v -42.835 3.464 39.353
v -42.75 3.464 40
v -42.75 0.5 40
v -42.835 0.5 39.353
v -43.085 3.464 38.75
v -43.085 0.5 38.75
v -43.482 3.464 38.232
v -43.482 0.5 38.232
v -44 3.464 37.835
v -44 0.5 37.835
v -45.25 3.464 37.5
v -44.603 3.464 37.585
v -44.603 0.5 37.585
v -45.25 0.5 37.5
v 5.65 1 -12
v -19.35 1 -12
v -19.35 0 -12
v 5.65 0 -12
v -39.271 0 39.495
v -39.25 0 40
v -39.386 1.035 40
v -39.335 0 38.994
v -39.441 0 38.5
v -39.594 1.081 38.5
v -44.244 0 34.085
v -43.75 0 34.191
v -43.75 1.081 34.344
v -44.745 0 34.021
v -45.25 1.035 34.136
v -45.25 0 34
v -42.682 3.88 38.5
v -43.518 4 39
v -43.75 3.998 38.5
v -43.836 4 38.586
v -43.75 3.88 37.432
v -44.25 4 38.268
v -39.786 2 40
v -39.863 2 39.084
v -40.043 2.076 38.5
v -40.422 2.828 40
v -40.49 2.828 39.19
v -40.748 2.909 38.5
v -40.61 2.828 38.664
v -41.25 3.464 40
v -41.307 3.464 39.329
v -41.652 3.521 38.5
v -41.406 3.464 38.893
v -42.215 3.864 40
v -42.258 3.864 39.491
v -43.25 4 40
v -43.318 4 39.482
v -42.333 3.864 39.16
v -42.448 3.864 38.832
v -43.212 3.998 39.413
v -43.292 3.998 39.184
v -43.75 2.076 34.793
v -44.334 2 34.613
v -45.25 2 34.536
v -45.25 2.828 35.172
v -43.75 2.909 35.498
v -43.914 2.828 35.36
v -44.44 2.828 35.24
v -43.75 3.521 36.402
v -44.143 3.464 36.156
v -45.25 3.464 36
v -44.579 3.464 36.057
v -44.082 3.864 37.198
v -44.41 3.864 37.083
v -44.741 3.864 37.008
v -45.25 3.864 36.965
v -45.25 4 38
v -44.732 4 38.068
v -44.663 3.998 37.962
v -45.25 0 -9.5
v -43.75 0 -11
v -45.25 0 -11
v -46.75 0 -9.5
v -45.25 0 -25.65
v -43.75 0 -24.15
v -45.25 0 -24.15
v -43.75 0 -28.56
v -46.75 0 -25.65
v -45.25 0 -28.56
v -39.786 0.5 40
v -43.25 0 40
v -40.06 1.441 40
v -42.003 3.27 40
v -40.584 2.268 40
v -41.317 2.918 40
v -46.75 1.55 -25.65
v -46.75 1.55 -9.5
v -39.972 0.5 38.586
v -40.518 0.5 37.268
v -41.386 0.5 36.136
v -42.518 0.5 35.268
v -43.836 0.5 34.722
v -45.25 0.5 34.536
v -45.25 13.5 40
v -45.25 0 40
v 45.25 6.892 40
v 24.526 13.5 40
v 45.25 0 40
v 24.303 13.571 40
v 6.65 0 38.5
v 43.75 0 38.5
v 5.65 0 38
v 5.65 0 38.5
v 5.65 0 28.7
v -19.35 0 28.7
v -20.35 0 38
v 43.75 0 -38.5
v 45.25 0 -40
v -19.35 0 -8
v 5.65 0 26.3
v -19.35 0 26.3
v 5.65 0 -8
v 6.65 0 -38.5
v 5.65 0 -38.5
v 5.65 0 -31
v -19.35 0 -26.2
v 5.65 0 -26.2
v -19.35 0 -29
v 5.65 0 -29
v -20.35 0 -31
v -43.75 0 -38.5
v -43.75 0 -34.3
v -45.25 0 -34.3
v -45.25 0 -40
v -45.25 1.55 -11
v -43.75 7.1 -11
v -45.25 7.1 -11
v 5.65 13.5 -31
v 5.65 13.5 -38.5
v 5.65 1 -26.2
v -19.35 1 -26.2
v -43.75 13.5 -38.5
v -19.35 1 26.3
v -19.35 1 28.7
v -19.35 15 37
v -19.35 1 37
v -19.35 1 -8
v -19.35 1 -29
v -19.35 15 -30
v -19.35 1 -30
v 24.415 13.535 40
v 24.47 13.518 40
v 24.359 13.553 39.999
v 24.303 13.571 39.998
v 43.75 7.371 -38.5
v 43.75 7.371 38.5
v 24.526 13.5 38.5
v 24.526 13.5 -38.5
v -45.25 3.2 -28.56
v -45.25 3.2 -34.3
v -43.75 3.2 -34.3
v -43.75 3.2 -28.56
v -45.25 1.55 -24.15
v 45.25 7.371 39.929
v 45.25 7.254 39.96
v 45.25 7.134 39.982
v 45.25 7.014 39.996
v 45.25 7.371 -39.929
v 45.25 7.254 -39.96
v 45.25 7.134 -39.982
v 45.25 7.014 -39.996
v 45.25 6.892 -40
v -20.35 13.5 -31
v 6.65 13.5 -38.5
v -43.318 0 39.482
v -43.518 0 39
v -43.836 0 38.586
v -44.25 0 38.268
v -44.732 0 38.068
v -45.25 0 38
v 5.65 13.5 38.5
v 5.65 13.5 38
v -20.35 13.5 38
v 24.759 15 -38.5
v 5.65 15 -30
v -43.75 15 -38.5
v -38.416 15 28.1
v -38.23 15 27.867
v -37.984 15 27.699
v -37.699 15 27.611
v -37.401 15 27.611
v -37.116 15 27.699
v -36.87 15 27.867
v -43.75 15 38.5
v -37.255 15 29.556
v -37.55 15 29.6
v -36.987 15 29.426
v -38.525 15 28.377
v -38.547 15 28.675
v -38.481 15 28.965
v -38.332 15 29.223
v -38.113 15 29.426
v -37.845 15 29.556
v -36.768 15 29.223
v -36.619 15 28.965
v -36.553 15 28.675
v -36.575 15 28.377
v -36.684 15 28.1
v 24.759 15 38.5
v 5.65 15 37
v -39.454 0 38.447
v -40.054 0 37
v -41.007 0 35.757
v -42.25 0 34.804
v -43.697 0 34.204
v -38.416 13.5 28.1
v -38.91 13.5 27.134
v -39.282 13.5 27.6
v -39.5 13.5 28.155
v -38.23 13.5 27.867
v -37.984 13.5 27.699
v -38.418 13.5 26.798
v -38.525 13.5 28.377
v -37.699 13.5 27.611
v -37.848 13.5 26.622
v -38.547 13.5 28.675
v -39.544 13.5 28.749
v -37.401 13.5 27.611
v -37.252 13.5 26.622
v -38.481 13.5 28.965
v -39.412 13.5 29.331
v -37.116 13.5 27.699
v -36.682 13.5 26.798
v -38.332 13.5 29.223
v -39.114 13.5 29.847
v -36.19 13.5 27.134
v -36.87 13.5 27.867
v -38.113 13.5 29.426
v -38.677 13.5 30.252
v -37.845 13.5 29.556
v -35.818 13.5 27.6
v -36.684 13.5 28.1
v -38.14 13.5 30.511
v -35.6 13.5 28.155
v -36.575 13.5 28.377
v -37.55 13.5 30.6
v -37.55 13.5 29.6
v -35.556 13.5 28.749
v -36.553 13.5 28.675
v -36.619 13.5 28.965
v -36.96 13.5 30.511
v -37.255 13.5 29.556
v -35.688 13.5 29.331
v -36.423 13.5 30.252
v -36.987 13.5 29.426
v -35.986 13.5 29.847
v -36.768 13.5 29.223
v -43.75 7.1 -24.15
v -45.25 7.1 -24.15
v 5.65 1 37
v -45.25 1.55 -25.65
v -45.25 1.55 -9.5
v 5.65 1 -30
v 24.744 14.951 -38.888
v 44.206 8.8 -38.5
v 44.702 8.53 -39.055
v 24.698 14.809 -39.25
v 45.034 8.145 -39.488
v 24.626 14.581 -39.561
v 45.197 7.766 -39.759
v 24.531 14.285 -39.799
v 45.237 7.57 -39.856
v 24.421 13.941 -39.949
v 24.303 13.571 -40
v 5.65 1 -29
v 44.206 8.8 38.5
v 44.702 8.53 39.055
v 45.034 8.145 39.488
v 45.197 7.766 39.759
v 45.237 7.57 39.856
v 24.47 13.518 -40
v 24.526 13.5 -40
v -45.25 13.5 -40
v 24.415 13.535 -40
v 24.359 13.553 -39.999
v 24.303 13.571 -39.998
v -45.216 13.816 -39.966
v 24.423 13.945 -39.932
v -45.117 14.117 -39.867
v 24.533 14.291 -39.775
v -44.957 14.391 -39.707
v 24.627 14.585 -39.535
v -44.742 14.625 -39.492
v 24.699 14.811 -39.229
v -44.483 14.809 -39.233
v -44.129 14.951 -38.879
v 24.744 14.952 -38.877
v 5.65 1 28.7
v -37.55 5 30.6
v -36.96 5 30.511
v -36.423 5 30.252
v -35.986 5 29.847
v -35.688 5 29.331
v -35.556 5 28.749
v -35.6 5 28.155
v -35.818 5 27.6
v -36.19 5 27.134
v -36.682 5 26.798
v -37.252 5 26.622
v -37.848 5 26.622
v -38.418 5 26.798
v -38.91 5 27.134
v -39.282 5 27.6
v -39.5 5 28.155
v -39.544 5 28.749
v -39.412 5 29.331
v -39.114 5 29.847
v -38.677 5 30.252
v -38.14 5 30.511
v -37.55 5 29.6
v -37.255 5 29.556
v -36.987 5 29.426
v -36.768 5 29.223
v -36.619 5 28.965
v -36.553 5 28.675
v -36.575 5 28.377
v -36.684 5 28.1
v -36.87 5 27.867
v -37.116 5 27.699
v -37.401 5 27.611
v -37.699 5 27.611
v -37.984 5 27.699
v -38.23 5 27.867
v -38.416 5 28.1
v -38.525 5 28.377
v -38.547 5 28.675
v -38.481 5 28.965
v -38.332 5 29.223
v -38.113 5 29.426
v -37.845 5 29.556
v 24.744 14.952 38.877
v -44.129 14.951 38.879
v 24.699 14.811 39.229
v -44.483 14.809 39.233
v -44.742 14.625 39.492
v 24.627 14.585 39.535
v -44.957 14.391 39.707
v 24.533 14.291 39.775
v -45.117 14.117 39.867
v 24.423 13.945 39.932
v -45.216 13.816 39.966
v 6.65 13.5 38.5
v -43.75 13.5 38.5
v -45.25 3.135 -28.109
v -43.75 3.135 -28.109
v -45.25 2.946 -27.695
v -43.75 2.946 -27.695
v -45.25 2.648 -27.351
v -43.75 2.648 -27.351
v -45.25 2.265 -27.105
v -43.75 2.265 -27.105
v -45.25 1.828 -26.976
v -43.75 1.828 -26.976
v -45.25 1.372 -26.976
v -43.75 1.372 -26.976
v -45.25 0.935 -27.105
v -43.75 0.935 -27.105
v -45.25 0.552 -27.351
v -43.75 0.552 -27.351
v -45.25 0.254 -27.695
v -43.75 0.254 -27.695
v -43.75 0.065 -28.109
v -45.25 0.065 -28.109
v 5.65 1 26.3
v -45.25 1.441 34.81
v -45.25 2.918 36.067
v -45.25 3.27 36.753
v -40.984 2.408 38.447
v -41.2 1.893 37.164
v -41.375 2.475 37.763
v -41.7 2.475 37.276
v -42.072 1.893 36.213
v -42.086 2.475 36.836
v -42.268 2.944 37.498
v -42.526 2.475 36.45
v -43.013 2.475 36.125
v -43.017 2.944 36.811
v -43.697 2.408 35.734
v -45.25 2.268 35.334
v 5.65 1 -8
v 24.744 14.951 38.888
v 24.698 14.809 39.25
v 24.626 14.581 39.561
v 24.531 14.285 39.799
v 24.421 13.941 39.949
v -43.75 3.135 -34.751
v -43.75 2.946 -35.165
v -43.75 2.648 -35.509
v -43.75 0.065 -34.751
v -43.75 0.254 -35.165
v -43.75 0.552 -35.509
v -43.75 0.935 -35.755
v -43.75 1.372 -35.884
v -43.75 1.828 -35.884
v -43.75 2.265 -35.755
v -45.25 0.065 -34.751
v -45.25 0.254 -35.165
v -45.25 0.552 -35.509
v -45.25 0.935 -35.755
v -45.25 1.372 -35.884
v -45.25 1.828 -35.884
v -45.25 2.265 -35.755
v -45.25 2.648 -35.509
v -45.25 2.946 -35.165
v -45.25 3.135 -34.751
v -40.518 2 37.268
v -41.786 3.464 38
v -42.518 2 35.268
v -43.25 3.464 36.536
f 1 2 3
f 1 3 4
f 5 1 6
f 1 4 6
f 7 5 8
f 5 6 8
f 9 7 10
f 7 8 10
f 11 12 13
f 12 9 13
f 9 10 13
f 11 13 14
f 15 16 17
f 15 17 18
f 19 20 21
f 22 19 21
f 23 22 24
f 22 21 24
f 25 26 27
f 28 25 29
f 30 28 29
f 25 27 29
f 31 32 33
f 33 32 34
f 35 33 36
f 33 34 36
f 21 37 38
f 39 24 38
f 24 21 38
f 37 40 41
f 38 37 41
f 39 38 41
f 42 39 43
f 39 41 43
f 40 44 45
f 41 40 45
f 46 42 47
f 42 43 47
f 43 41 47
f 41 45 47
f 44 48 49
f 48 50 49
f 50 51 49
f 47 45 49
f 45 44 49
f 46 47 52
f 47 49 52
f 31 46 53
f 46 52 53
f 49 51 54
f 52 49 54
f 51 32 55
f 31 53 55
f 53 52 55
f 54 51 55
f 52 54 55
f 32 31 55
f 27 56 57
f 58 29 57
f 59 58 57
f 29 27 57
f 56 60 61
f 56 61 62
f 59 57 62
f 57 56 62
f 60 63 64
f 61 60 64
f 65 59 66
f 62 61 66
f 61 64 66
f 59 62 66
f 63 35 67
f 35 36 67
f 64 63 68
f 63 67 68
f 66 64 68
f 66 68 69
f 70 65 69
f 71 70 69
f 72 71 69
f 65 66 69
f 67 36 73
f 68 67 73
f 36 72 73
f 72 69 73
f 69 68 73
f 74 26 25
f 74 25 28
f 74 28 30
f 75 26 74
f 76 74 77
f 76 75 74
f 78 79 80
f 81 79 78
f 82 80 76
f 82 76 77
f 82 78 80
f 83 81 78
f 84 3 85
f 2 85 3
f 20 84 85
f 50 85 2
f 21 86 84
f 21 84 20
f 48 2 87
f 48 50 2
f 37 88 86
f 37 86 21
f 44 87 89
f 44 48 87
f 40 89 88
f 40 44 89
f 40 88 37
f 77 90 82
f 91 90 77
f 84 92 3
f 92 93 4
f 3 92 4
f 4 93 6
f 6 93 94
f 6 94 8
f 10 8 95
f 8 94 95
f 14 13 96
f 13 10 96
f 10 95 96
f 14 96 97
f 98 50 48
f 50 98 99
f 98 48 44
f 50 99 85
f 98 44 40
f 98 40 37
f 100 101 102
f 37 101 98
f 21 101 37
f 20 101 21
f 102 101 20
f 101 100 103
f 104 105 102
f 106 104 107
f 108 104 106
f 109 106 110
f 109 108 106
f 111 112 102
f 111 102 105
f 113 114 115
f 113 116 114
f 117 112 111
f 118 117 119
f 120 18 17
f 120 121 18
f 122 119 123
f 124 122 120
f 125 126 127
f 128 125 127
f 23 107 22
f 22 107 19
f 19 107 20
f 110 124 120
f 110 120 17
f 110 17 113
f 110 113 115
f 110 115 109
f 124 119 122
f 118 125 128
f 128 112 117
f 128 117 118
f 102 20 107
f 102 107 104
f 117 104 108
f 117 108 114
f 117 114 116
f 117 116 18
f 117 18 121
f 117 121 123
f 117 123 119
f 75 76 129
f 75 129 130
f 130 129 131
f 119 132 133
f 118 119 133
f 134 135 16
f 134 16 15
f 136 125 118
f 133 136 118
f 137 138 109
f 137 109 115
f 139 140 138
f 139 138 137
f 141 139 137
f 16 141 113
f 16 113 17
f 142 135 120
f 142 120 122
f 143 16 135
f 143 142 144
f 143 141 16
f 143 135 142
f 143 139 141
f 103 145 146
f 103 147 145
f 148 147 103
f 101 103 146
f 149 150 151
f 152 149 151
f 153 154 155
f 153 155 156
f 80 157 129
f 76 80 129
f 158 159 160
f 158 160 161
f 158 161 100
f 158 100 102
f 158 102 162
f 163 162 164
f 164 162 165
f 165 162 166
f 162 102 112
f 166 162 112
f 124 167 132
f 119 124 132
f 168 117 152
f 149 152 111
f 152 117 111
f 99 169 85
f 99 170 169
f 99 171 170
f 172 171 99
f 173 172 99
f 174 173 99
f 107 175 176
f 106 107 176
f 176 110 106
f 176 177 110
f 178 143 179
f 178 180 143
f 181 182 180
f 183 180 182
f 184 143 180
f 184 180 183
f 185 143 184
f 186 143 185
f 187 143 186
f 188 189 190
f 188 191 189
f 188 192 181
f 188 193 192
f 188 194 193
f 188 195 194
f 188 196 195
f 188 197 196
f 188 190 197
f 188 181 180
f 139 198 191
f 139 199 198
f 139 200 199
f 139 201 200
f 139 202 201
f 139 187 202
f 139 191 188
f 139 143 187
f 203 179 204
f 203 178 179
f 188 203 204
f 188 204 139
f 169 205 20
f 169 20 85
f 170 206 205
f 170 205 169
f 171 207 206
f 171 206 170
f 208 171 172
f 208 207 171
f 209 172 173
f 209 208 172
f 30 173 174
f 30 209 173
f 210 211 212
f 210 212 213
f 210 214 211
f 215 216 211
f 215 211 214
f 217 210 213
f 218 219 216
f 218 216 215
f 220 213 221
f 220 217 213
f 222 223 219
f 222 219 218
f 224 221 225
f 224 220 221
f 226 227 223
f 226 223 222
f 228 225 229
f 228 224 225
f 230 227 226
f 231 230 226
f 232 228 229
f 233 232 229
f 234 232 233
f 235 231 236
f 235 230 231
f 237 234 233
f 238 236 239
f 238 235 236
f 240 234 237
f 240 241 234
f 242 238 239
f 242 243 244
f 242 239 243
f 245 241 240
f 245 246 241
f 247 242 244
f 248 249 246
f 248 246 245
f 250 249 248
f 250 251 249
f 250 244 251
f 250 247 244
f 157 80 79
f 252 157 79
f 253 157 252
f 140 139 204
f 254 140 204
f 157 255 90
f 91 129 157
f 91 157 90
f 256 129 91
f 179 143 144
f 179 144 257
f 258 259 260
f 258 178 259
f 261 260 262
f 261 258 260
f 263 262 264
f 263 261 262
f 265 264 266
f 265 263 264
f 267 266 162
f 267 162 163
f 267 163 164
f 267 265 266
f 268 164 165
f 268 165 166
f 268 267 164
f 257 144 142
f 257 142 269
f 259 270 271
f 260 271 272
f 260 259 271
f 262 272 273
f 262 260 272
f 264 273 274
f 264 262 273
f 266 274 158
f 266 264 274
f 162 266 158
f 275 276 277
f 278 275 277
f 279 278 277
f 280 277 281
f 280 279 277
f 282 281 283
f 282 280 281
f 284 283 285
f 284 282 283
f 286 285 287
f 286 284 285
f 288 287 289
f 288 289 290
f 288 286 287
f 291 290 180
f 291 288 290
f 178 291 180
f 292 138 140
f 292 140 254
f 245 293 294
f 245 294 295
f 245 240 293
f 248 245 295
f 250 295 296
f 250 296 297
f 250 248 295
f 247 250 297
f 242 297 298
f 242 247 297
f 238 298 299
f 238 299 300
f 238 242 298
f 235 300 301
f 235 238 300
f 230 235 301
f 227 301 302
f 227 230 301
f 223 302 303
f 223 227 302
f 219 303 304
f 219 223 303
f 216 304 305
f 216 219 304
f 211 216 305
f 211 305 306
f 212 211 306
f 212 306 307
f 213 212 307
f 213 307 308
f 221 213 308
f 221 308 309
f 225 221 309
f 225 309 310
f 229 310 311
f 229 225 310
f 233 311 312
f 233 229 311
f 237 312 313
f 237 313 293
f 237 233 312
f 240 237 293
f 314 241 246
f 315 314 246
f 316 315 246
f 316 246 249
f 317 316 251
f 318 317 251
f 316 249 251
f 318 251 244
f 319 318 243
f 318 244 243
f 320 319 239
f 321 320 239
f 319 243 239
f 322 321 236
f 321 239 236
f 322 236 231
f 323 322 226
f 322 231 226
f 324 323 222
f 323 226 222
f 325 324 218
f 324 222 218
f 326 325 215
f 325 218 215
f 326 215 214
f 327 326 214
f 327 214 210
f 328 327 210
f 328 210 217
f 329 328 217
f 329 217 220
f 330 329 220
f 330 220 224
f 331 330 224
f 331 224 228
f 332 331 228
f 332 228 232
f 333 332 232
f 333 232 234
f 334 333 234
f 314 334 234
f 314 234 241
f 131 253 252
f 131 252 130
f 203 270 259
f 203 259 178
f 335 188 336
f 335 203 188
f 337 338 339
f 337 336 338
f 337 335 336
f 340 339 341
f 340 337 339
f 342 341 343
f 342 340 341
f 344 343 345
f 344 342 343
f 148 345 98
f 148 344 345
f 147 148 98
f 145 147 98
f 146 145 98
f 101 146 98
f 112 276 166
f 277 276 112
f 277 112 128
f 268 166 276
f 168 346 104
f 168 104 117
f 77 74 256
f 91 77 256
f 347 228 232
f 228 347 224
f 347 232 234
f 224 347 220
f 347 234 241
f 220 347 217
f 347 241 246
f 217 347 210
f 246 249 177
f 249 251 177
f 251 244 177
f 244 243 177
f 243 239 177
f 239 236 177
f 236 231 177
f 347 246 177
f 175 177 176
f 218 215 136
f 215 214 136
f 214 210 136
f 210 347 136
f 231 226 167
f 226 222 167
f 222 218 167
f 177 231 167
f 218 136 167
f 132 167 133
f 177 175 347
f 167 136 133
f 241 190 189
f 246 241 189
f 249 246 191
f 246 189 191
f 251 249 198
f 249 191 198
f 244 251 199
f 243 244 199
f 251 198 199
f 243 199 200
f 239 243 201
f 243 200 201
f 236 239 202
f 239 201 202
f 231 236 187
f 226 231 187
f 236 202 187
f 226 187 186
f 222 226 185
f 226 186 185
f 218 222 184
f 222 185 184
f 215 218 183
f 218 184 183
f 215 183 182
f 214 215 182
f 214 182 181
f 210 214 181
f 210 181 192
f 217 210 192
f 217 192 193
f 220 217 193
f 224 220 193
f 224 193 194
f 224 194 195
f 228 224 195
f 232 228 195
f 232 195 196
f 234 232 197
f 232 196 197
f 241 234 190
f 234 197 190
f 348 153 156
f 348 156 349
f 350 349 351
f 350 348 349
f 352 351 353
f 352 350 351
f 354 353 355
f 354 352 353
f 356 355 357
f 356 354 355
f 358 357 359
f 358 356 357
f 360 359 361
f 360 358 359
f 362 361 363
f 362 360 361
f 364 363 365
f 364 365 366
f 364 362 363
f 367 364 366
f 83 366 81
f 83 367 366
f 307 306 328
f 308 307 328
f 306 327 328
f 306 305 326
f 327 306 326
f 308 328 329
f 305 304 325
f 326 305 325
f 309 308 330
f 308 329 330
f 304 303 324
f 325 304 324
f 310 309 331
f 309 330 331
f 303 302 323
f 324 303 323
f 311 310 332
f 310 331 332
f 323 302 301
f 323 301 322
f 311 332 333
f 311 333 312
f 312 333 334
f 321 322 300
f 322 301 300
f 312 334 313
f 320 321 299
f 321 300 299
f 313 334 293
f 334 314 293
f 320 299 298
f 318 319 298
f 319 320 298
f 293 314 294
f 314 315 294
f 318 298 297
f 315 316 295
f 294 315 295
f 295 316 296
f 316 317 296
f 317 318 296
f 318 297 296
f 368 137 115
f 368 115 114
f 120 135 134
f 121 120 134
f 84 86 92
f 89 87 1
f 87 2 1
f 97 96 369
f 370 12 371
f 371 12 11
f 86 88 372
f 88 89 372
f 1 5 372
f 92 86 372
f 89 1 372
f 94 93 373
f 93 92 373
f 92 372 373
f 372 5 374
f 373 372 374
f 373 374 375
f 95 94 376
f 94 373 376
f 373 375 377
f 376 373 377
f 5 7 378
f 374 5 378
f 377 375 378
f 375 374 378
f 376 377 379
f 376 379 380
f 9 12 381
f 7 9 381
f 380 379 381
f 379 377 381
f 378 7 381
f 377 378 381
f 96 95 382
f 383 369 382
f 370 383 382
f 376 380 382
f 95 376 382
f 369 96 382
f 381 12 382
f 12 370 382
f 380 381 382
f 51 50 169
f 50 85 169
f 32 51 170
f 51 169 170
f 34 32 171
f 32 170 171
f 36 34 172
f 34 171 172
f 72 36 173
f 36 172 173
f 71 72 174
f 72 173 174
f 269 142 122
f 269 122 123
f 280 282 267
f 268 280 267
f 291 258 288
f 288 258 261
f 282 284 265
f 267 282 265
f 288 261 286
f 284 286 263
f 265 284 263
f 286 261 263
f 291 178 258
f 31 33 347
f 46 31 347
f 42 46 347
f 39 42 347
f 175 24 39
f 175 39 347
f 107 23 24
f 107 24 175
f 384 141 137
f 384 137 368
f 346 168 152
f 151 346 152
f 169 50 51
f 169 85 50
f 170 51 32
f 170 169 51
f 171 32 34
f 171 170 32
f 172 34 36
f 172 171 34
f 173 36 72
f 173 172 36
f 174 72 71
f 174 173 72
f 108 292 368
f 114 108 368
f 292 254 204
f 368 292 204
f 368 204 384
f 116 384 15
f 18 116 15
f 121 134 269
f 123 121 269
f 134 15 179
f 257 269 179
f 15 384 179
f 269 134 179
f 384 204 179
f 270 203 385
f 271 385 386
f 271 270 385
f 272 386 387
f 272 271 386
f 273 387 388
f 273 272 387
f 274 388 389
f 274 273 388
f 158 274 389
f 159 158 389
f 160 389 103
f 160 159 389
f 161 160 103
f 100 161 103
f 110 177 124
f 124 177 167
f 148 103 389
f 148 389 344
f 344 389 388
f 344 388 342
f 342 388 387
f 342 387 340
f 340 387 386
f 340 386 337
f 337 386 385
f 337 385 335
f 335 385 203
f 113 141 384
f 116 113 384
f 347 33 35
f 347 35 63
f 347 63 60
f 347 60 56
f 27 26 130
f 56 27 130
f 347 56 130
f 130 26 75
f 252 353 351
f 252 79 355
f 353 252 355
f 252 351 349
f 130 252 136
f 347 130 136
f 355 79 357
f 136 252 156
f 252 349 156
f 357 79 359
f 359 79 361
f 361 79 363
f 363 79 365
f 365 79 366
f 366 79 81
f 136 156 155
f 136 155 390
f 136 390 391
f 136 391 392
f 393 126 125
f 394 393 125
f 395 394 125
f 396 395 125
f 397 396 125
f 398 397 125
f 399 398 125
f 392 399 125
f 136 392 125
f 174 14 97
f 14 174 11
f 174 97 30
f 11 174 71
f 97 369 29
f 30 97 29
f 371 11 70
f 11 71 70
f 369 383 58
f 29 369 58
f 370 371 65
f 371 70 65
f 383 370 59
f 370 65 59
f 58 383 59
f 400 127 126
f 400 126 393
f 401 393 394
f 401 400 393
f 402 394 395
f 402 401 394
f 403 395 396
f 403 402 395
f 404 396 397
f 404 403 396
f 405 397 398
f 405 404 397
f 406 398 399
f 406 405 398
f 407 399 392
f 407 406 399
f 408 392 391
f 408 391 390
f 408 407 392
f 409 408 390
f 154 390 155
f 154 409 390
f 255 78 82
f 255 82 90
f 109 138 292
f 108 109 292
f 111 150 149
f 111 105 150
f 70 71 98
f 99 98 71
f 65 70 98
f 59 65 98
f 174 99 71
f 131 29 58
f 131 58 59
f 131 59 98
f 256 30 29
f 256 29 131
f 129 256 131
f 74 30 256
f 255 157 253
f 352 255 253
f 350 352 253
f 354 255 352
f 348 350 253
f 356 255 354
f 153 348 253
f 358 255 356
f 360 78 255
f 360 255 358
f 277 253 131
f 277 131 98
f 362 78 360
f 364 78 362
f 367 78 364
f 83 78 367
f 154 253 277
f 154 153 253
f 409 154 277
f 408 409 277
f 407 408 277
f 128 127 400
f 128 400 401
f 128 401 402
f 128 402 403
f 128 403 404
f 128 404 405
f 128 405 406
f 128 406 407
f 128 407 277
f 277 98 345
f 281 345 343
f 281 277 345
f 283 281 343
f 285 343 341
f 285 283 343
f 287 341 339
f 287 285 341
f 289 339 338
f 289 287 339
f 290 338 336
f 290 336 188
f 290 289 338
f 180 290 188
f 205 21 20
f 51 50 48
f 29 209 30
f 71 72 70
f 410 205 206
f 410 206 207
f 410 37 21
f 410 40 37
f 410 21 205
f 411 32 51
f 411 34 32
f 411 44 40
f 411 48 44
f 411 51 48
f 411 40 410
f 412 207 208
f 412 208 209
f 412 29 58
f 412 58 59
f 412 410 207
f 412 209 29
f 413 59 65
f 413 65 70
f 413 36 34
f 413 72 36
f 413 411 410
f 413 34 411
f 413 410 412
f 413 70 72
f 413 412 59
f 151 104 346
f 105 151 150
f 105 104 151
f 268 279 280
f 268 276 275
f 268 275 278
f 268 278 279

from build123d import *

# Parameters (mm, degrees)
SKETCH1_W            = 90.5
SKETCH1_H            = 80
BOSS_EXTRUDE1_DEPTH  = 15
SHELL3_T             = -1.5
CUT_EXTRUDE2_DEPTH   = 1.5
SKETCH6_W            = 13.15
SKETCH6_H            = 7.1
CUT_EXTRUDE3_DEPTH   = 1.5
SKETCH9_W            = 16.15
SKETCH9_H            = 1.55
BOSS_EXTRUDE2_DEPTH  = 1.5
FILLET7_R            = 1.5
SKETCH20_W           = 25
SKETCH20_H           = 67
BOSS_EXTRUDE8_DEPTH  = 14
SKETCH20_2_W         = 25
SKETCH20_2_H         = 67
CUT_EXTRUDE9_DEPTH   = 1.5
SHELL6_T             = 1
SKETCH21_W           = 1
SKETCH21_H           = 0.5
SKETCH21_H_2         = 7.5
BOSS_EXTRUDE9_DEPTH  = 13.5
SKETCH11_R           = 1
BOSS_EXTRUDE10_DEPTH = 10
SKETCH11_3_R         = 1
CUT_EXTRUDE10_DEPTH  = 1.5
SHELL9_T             = 1
CUT_REVOLVE4_ANGLE   = 90
REVOLVE3_ANGLE       = 90
SHELL14_T            = -0.5
SKETCH41_W           = 25
SKETCH41_H           = 2.8
SKETCH41_H_2         = 4
SKETCH41_H_3         = 2.4
CUT_EXTRUDE11_DEPTH  = 1
SKETCH45_W           = 21.507249936
SKETCH45_H           = 80
CUT_EXTRUDE13_DEPTH  = 10
SKETCH45_2_W         = 21.507249936
SKETCH45_2_H         = 80
BOSS_EXTRUDE11_DEPTH = 1.5
FILLET11_R           = 1.5


with BuildPart() as part:
    # Sketch1 → Boss-Extrude1 (new body)
    with BuildSketch(Plane(origin=(0, 0, 0), x_dir=(1, 0, 0), z_dir=(0, 1, 0))):
        Rectangle(SKETCH1_W, SKETCH1_H)
    extrude(amount=BOSS_EXTRUDE1_DEPTH)

    # Shell3
    shell3_openings = [part.faces().sort_by_distance(p)[0] for p in [
        (0, 0, 0),
    ]]
    offset(amount=SHELL3_T, openings=shell3_openings, kind=Kind.INTERSECTION)

    # Sketch4 → Cut-Extrude2 (cut)
    with BuildSketch(Plane.ZY.offset(45.25)):
        with BuildLine():
            Line((-34.3, 3.2), (-28.56, 3.2))
            ThreePointArc((-28.56, 3.2), (-26.96, 1.6), (-28.56, 0))
            Line((-28.56, 0), (-34.3, 0))
            ThreePointArc((-34.3, 0), (-35.9, 1.6), (-34.3, 3.2))
        make_face()
    extrude(amount=-CUT_EXTRUDE2_DEPTH, mode=Mode.SUBTRACT)

    # Sketch6 → Cut-Extrude3 (cut)
    with BuildSketch(Plane.ZY.offset(45.25)):
        with Locations((-17.575, 3.55)):
            Rectangle(SKETCH6_W, SKETCH6_H)
    extrude(amount=-CUT_EXTRUDE3_DEPTH, mode=Mode.SUBTRACT)

    # Sketch9 → Boss-Extrude2 (add)
    with BuildSketch(Plane.ZY.offset(45.25)):
        with Locations((-17.575, 0.775)):
            Rectangle(SKETCH9_W, SKETCH9_H)
    extrude(amount=BOSS_EXTRUDE2_DEPTH)

    # Fillet7
    fillet7_edges = [part.edges().sort_by_distance(p)[0] for p in [
        (-45.25, 15, 0),
        (0, 15, 40),
        (45.25, 15, 0),
        (0, 15, -40),
    ]]
    fillet(fillet7_edges, radius=FILLET7_R)

    # Sketch20 → Boss-Extrude8 (add)
    with BuildSketch(Plane(origin=(0, 15, 0), x_dir=(1, 0, 0), z_dir=(0, 1, 0))):
        with Locations((-6.85, -3.5)):
            Rectangle(SKETCH20_W, SKETCH20_H)
    extrude(amount=-BOSS_EXTRUDE8_DEPTH)

    # Sketch20<2> → Cut-Extrude9 (cut)
    with BuildSketch(Plane(origin=(0, 15, 0), x_dir=(1, 0, 0), z_dir=(0, 1, 0))):
        with Locations((-6.85, -3.5)):
            Rectangle(SKETCH20_2_W, SKETCH20_2_H)
    extrude(amount=-CUT_EXTRUDE9_DEPTH, mode=Mode.SUBTRACT)


with BuildPart() as cut_extrude9_piece_1:
    # of the separate pieces the step leaves, piece 1, a body of its own (cut_extrude9_pieces)
    add(part.part.solids().sort_by_distance((-19.35, 1, -30))[0])

    # Shell6
    shell6_openings = [cut_extrude9_piece_1.faces().sort_by_distance(p)[0] for p in [
        (-6.85, 13.5, 3.5),
    ]]
    offset(amount=SHELL6_T, openings=shell6_openings, kind=Kind.INTERSECTION)



with BuildPart() as cut_extrude9_piece_2:
    # of the separate pieces the step leaves, piece 2, a body of its own (cut_extrude9_pieces)
    add(part.part.solids().sort_by_distance((-45.25, 13.5, 40))[0])


with BuildPart() as cut_extrude9_piece_1_1:
    add(cut_extrude9_piece_1.part)

    add(cut_extrude9_piece_2.part)  # Boss-Extrude9 merges Cut-Extrude9 piece 2
    # Sketch21 → Boss-Extrude9 (add)
    with BuildSketch(Plane(origin=(0, 13.5, 0), x_dir=(-1, 0, 0), z_dir=(0, -1, 0))):
        with Locations((-6.15, -38.25)):
            Rectangle(SKETCH21_W, SKETCH21_H)
        with Locations((-6.15, 34.75)):
            Rectangle(SKETCH21_W, SKETCH21_H_2)
    extrude(amount=BOSS_EXTRUDE9_DEPTH)

    # Sketch11 → Boss-Extrude10 (add)
    with BuildSketch(Plane(origin=(0, 15, 0), x_dir=(1, 0, 0), z_dir=(0, 1, 0))):
        with Locations(Location((-37.55, -28.6, 0), (0, 0, 270))):
            Circle(SKETCH11_R)
    extrude(amount=-BOSS_EXTRUDE10_DEPTH)

    # Sketch11<3> → Cut-Extrude10 (cut)
    with BuildSketch(Plane(origin=(0, 15, 0), x_dir=(1, 0, 0), z_dir=(0, 1, 0))):
        with Locations(Location((-37.55, -28.6, 0), (0, 0, 270))):
            Circle(SKETCH11_3_R)
    extrude(amount=-CUT_EXTRUDE10_DEPTH, mode=Mode.SUBTRACT)


with BuildPart() as cut_extrude10_piece_1:
    # of the separate pieces the step leaves, piece 1, a body of its own (cut_extrude10_pieces)
    add(cut_extrude9_piece_1_1.part.solids().sort_by_distance((-45.25, 13.5, 40))[0])

    # Sketch33 → Cut-Revolve4 (revolve, cut)
    with BuildSketch(Plane.XY.offset(40)):
        with BuildLine():
            Line((-43.25, 4), (-43.25, 0))
            Line((-43.25, 0), (-39.25, 0))
            ThreePointArc((-39.25, 0), (-40.421572875, 2.828427125), (-43.25, 4))
        make_face()
    revolve(axis=Axis((-45.25, 15, 40), (0, 1, 0)), revolution_arc=CUT_REVOLVE4_ANGLE, mode=Mode.SUBTRACT)

    # Sketch41 → Cut-Extrude11 (cut)
    with BuildSketch(Plane(origin=(0, 1, 0), x_dir=(1, 0, 0), z_dir=(0, 1, 0))):
        with Locations((-6.85, 27.6)):
            Rectangle(SKETCH41_W, SKETCH41_H)
        with Locations((-6.85, 10)):
            Rectangle(SKETCH41_W, SKETCH41_H_2)
        with Locations((-6.85, -27.5)):
            Rectangle(SKETCH41_W, SKETCH41_H_3)
    extrude(amount=-CUT_EXTRUDE11_DEPTH, mode=Mode.SUBTRACT)

    # Sketch45 → Cut-Extrude13 (cut)
    with BuildSketch(Plane(origin=(6.62600572, 20.781563394, 0), x_dir=(-0.9527442677113392, 0.3037735346326008, 0), z_dir=(-0.3037735346326008, -0.9527442677113392, 0))):
        with Locations((-29.786103886, 0)):
            Rectangle(SKETCH45_W, SKETCH45_H)
    extrude(amount=-CUT_EXTRUDE13_DEPTH, mode=Mode.SUBTRACT)

    # Sketch45<2> → Boss-Extrude11 (add)
    with BuildSketch(Plane(origin=(6.62600572, 20.781563394, 0), x_dir=(-0.9527442677113392, 0.3037735346326008, 0), z_dir=(-0.3037735346326008, -0.9527442677113392, 0))):
        with Locations((-29.786103886, 0)):
            Rectangle(SKETCH45_2_W, SKETCH45_2_H)
    extrude(amount=BOSS_EXTRUDE11_DEPTH)

    # Fillet11
    fillet11_edges = [cut_extrude10_piece_1.edges().sort_by_distance(p)[0] for p in [
        (45.25, 8.466666667, 0),
        (35.004545455, 11.733333333, 40),
        (35.004545455, 11.733333333, -40),
    ]]
    fillet(fillet11_edges, radius=FILLET11_R - 0.0001)  # a hair under: the kernel refuses the full size


with BuildPart() as cut_extrude10_piece_2:
    # of the separate pieces the step leaves, piece 2, a body of its own (cut_extrude10_pieces)
    add(cut_extrude9_piece_1_1.part.solids().sort_by_distance((-37.55, 5, 29.6))[0])

    # Shell9
    shell9_openings = [cut_extrude10_piece_2.faces().sort_by_distance(p)[0] for p in [
        (-37.55, 5, 28.6),
        (-37.55, 13.5, 28.6),
    ]]
    offset(amount=SHELL9_T, openings=shell9_openings, kind=Kind.INTERSECTION)


with BuildPart() as body_3:
    # Sketch33<2> → Revolve3 (revolve)
    with BuildSketch(Plane.XY.offset(40)):
        with BuildLine():
            Line((-43.25, 4), (-43.25, 0))
            Line((-43.25, 0), (-39.25, 0))
            ThreePointArc((-39.25, 0), (-40.421572875, 2.828427125), (-43.25, 4))
        make_face()
    revolve(axis=Axis((-45.25, 15, 40), (0, 1, 0)), revolution_arc=REVOLVE3_ANGLE)

    # Shell14
    shell14_openings = [body_3.faces().sort_by_distance(p)[0] for p in [
        (-45.25, 1.697652726, 36.302347274),
        (-41.552347274, 1.697652726, 40),
    ]]
    offset(amount=SHELL14_T, openings=shell14_openings)


solid = Compound([cut_extrude10_piece_1.part, cut_extrude10_piece_2.part, body_3.part])
